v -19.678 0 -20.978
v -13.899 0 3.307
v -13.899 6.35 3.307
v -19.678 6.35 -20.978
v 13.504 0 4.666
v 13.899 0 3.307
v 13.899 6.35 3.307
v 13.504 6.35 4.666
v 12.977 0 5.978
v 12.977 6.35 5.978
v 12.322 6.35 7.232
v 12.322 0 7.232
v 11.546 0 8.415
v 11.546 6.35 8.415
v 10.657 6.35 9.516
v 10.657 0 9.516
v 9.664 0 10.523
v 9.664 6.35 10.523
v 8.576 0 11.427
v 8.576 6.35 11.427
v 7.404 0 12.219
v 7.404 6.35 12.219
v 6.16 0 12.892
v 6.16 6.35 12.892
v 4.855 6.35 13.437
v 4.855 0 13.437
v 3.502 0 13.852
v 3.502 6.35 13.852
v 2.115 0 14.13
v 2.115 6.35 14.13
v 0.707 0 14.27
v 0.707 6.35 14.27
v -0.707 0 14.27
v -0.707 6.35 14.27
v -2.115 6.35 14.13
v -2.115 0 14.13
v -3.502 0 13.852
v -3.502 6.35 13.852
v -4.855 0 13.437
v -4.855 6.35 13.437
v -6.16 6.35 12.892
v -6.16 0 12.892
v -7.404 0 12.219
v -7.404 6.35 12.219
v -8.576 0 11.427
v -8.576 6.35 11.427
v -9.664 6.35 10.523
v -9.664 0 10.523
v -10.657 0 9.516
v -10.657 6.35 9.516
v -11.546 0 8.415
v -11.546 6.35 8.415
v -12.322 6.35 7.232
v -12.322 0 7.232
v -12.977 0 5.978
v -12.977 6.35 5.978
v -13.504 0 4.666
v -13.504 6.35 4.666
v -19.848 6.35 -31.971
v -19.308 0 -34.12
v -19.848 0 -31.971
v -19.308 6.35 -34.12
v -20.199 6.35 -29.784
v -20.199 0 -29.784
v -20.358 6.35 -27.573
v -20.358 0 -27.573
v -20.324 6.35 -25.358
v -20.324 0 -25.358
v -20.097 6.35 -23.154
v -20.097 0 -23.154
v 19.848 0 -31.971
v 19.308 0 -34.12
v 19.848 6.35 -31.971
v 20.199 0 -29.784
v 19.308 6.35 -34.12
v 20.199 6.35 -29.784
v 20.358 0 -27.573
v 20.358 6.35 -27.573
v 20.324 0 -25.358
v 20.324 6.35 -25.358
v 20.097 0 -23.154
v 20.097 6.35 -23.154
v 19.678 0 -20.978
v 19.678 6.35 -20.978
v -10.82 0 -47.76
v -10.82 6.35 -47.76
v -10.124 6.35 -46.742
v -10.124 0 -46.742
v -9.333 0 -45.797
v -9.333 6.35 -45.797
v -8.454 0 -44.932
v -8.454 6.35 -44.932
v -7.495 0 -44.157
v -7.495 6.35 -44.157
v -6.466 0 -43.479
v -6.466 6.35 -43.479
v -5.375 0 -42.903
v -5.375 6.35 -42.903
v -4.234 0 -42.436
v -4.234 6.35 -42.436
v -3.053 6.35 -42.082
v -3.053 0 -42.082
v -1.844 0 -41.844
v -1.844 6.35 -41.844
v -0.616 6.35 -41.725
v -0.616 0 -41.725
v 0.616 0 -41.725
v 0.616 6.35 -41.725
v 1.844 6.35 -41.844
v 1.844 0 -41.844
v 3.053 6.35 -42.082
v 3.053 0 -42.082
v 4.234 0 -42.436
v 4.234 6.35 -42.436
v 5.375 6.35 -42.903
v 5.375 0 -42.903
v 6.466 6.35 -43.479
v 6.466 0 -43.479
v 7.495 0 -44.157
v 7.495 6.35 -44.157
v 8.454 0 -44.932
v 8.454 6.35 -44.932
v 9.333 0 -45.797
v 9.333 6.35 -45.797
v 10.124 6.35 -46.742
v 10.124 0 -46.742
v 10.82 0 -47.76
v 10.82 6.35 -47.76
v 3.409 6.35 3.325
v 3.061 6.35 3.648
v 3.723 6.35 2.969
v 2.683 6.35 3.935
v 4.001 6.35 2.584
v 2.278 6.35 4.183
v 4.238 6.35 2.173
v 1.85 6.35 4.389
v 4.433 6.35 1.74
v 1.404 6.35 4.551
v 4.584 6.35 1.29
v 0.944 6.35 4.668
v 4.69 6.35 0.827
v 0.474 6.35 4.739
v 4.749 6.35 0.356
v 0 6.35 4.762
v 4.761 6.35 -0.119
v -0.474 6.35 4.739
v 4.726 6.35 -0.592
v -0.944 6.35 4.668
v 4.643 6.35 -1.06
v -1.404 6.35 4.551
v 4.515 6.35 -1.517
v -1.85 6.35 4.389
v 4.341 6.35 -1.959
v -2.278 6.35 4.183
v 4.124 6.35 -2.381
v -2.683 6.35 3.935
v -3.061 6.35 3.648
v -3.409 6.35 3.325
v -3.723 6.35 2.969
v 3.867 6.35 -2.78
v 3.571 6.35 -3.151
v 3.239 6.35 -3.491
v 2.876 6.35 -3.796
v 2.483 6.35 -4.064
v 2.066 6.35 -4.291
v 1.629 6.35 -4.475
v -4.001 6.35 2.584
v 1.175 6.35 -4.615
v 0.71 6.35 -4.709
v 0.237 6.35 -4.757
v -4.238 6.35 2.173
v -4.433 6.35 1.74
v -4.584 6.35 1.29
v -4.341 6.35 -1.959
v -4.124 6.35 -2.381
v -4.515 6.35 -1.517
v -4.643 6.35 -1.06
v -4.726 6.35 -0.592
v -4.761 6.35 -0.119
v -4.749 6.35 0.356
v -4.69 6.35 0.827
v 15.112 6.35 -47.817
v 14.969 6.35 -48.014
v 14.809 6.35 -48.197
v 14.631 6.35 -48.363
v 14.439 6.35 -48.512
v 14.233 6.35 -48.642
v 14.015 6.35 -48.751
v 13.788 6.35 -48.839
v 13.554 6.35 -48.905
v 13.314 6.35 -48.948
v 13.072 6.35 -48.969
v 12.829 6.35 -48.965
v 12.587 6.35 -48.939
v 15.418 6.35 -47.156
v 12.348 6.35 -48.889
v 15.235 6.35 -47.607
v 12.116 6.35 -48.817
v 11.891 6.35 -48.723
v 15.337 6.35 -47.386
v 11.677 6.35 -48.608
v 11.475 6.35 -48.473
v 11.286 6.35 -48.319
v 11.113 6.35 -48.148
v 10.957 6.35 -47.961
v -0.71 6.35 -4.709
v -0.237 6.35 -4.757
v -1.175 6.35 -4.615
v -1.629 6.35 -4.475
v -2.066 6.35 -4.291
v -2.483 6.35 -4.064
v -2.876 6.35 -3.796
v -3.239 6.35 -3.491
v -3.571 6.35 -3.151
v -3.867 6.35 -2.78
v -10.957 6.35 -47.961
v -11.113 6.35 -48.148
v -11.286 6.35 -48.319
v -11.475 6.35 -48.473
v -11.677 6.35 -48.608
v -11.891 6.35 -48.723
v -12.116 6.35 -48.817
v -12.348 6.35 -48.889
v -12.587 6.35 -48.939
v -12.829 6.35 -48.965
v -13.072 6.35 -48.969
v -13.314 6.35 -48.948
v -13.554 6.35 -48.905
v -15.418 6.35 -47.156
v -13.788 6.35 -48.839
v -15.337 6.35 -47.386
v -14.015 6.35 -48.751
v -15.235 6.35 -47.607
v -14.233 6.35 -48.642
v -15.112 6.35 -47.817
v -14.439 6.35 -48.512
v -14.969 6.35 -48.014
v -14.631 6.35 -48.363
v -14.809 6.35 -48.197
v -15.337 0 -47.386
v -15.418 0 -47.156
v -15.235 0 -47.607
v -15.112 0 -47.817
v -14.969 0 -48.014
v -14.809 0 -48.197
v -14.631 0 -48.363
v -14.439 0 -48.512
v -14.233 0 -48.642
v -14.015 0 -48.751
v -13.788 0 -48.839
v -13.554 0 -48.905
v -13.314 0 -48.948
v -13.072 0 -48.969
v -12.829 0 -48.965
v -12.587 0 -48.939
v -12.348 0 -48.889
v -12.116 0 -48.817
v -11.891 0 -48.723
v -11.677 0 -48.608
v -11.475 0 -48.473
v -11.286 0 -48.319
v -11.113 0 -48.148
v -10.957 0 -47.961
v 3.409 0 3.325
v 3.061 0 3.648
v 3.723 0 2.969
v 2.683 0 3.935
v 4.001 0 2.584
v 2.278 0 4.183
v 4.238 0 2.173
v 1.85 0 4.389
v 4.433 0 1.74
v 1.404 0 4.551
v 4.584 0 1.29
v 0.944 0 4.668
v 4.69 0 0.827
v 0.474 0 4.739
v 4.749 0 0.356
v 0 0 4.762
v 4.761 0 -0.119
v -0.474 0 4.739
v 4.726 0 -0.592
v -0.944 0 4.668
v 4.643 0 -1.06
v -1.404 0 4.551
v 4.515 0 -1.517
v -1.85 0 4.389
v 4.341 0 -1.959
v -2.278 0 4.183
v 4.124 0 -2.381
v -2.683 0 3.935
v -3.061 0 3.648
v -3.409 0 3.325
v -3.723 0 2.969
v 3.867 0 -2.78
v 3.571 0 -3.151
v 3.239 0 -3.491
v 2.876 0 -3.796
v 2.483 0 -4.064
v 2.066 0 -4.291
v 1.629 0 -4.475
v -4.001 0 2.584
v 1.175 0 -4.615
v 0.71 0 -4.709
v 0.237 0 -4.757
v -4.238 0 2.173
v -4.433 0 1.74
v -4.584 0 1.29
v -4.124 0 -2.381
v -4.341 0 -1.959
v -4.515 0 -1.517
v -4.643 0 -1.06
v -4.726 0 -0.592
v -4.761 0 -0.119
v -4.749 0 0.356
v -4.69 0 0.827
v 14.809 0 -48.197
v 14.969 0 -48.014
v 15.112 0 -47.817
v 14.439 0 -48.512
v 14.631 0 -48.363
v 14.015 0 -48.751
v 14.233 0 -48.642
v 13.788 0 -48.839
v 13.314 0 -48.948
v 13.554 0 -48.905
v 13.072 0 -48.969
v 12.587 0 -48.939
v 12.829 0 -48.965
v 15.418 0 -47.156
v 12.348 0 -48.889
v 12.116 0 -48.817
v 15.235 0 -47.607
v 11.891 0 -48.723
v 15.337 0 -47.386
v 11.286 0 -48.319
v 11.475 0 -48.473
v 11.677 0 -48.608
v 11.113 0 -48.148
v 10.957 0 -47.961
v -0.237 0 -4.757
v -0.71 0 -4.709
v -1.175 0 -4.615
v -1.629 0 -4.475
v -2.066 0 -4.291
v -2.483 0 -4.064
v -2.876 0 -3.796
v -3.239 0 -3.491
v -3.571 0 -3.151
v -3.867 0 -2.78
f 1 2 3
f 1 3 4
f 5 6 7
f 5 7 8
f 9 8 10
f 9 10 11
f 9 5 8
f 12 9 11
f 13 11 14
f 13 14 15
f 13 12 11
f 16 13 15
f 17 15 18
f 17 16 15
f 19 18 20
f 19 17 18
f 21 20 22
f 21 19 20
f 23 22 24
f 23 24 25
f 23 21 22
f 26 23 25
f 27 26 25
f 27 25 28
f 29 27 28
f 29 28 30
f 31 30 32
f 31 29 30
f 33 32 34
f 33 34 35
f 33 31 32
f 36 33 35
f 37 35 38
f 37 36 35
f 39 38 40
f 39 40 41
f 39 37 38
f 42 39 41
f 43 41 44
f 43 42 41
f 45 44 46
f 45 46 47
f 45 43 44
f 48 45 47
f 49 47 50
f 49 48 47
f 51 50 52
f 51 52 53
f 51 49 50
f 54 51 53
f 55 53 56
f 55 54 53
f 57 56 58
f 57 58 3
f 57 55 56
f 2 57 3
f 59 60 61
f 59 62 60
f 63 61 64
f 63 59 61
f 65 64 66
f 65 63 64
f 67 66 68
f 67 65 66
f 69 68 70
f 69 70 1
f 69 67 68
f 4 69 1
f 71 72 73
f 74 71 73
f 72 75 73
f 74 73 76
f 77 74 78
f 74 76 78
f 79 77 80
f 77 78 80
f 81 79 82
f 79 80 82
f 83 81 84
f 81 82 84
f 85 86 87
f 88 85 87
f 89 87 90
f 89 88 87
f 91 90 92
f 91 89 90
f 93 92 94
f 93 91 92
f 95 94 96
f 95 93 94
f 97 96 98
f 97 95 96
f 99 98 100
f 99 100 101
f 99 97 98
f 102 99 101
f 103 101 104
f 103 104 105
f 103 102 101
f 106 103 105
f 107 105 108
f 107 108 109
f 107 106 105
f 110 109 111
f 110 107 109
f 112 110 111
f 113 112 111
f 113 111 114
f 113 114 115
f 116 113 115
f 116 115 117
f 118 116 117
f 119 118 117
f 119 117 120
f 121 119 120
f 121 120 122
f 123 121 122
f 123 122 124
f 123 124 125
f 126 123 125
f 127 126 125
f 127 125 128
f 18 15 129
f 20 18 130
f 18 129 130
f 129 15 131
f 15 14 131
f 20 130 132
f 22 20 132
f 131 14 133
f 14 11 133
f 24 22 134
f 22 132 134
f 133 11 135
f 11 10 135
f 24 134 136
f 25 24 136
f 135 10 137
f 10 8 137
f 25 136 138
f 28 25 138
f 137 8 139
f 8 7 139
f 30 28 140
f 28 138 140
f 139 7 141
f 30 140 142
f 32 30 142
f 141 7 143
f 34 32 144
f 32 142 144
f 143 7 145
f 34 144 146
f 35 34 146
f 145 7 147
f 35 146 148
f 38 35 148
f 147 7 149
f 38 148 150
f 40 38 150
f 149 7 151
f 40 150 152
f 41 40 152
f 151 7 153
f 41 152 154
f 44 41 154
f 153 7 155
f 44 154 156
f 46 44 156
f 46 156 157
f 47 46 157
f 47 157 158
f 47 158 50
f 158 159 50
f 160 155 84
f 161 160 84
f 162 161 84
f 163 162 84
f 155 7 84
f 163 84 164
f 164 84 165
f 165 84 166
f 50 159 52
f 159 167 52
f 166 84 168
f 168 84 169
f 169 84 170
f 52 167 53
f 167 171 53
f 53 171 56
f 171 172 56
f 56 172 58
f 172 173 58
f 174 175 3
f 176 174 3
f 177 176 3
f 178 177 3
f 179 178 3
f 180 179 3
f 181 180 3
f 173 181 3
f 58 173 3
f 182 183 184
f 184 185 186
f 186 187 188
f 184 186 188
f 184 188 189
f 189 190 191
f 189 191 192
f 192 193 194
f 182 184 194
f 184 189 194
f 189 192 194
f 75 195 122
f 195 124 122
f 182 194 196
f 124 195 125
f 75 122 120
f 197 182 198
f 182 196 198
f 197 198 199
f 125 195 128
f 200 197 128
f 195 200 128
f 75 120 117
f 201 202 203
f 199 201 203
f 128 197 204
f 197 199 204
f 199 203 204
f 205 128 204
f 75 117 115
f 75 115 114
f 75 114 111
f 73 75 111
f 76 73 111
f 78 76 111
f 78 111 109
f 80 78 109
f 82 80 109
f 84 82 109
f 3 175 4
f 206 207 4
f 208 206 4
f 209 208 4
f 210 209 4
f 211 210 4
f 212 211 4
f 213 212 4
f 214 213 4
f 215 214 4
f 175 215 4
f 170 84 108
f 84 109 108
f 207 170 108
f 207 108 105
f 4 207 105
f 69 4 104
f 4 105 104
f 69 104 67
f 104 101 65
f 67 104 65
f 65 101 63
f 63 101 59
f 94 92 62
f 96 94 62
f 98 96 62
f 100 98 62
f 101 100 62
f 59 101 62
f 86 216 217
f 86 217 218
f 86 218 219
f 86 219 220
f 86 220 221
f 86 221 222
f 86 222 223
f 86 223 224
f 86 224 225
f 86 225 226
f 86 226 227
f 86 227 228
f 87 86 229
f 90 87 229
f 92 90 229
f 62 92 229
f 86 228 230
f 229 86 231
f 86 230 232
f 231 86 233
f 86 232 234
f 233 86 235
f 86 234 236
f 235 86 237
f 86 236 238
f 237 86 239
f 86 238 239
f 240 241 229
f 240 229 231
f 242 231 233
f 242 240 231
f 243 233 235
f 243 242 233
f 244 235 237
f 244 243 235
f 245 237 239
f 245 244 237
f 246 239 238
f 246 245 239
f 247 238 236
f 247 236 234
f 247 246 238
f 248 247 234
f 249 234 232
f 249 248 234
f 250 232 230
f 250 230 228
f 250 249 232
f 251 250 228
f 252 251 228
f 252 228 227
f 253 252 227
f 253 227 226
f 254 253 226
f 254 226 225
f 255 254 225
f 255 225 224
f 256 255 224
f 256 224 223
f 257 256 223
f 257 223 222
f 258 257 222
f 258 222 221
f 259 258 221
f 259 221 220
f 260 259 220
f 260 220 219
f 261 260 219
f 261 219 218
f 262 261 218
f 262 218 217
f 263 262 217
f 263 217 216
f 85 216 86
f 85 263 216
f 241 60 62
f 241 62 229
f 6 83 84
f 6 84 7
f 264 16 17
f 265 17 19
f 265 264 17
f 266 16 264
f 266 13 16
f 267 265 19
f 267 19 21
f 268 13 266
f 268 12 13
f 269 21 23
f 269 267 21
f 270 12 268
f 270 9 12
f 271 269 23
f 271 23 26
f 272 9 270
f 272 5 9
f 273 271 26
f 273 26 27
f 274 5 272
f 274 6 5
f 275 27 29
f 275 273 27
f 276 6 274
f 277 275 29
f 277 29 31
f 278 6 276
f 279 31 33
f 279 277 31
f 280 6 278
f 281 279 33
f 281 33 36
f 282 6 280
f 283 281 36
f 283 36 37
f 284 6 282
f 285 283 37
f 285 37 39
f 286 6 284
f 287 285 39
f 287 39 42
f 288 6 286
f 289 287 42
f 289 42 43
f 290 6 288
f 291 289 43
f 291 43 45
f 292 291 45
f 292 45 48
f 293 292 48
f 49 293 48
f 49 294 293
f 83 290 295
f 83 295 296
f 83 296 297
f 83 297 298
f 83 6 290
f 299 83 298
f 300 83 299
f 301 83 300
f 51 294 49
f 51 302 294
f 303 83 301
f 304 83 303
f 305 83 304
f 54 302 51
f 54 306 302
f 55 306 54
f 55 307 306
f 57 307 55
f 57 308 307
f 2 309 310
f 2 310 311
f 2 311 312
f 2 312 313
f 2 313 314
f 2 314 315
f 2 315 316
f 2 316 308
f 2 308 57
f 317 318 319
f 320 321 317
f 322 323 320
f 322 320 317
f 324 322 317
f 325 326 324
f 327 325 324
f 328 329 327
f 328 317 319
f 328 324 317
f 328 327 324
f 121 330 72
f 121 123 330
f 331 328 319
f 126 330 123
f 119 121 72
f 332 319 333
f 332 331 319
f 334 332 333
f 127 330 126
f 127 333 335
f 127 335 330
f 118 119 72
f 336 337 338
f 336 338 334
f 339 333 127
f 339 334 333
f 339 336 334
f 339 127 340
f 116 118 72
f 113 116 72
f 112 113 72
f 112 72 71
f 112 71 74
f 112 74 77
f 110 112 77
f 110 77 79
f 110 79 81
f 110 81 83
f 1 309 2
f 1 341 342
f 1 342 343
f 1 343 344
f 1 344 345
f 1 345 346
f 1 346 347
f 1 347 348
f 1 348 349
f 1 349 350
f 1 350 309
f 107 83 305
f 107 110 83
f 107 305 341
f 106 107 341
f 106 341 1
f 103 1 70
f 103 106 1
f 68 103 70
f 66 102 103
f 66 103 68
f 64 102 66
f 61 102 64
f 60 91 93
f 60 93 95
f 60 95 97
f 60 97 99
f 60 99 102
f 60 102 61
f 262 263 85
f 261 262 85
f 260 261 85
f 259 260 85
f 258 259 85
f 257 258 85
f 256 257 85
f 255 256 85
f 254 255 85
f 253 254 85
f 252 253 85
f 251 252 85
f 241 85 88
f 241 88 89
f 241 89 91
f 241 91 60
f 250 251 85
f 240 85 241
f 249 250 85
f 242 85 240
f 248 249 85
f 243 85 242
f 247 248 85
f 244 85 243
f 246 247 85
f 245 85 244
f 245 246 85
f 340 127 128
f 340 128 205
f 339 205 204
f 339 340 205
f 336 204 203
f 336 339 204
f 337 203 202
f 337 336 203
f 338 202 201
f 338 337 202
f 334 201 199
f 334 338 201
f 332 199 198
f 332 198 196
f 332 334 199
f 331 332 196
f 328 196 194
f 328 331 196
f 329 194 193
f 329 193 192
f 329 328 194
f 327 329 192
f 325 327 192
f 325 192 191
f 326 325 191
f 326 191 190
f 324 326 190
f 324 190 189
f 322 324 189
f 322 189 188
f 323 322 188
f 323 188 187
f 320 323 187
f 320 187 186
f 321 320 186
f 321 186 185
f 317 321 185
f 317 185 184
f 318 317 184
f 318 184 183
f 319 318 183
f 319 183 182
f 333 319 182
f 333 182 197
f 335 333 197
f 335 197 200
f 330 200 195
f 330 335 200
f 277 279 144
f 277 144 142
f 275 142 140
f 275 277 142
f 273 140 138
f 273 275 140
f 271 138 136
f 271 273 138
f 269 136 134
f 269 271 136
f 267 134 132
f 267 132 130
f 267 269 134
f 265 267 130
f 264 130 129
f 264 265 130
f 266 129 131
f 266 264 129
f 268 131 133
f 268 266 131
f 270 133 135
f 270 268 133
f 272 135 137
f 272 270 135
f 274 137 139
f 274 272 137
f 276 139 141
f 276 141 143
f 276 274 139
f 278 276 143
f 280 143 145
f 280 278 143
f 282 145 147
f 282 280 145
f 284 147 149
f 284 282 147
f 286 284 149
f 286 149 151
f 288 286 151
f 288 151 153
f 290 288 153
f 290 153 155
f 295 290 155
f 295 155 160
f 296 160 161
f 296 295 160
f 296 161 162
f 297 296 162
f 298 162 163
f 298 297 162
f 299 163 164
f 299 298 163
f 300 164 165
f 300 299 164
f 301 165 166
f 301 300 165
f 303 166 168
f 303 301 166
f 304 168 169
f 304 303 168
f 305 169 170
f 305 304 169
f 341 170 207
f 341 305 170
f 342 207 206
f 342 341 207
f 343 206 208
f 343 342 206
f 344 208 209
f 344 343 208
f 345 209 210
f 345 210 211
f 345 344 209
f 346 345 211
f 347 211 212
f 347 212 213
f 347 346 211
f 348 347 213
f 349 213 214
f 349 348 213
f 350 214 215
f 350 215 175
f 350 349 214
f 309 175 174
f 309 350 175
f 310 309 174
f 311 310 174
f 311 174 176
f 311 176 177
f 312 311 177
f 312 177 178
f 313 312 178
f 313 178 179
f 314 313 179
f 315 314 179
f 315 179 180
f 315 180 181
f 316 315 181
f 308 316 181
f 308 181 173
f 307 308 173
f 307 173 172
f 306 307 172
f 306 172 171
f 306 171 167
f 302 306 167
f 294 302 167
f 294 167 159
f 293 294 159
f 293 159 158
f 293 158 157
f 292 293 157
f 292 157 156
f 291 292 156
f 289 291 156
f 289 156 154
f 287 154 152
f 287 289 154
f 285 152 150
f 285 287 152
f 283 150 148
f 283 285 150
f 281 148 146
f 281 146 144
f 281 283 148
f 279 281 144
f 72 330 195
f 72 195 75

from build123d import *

# Parameters (mm, degrees)
SKETCH13_R          = 4.7625
BOSS_EXTRUDE1_DEPTH = 6.35
FILLET1_START       = -1
FILLET1_DEPTH       = 8
FILLET2_R           = 25.4


with BuildPart() as part:
    # Sketch13 → Boss-Extrude1 (new body)
    with BuildSketch(Plane(origin=(0, 0, 0), x_dir=(1, 0, 0), z_dir=(0, 1, 0))):
        with BuildLine():
            Line((12.169749373, 58.041291034), (21.253749792, 27.59863924))
            Line((21.253749792, 27.59863924), (13.899399026, -3.307470782))
            ThreePointArc((13.899399026, -3.307470782), (0, -14.2875), (-13.899399026, -3.307470782))
            Line((-13.899399026, -3.307470782), (-21.253749792, 27.59863924))
            Line((-21.253749792, 27.59863924), (-12.169749373, 58.041291034))
            ThreePointArc((-12.169749373, 58.041291034), (0, 41.709872551), (12.169749373, 58.041291034))
        make_face()
        with Locations(Location((0, 0, 0), (0, 0, 270))):
            Circle(SKETCH13_R, mode=Mode.SUBTRACT)
    extrude(amount=BOSS_EXTRUDE1_DEPTH)

    # Fillet1: read off the stored shape, not the designer's step
    # Fillet1 outline → Fillet1 (cut)
    with BuildSketch(Plane(origin=(0, 0, 0), x_dir=(1, 0, 0), z_dir=(0, 1, 0)).offset(FILLET1_START)):
        with BuildLine():
            ThreePointArc((12.169749373, 58.041291034), (12.591930806, 52.756609539), (10.819865776, 47.760022584))
            ThreePointArc((10.819865776, 47.760022584), (13.314491534, 48.948438752), (15.417788806, 47.156336287))
            Line((15.417788806, 47.156336287), (12.169749373, 58.041291034))
        make_face()
        with BuildLine():
            ThreePointArc((-15.417788806, 47.156336287), (-13.314491534, 48.948438752), (-10.819865776, 47.760022584))
            ThreePointArc((-10.819865776, 47.760022584), (-12.591930806, 52.756609539), (-12.169749373, 58.041291034))
            Line((-12.169749373, 58.041291034), (-15.417788806, 47.156336287))
        make_face()
    extrude(amount=FILLET1_DEPTH, mode=Mode.SUBTRACT)

    # Fillet2
    fillet2_edges = [part.edges().sort_by_distance(p)[0] for p in [
        (21.253749792, 3.175, -27.59863924),
        (-21.253749792, 3.175, -27.59863924),
    ]]
    fillet(fillet2_edges, radius=FILLET2_R)


solid = part.part
